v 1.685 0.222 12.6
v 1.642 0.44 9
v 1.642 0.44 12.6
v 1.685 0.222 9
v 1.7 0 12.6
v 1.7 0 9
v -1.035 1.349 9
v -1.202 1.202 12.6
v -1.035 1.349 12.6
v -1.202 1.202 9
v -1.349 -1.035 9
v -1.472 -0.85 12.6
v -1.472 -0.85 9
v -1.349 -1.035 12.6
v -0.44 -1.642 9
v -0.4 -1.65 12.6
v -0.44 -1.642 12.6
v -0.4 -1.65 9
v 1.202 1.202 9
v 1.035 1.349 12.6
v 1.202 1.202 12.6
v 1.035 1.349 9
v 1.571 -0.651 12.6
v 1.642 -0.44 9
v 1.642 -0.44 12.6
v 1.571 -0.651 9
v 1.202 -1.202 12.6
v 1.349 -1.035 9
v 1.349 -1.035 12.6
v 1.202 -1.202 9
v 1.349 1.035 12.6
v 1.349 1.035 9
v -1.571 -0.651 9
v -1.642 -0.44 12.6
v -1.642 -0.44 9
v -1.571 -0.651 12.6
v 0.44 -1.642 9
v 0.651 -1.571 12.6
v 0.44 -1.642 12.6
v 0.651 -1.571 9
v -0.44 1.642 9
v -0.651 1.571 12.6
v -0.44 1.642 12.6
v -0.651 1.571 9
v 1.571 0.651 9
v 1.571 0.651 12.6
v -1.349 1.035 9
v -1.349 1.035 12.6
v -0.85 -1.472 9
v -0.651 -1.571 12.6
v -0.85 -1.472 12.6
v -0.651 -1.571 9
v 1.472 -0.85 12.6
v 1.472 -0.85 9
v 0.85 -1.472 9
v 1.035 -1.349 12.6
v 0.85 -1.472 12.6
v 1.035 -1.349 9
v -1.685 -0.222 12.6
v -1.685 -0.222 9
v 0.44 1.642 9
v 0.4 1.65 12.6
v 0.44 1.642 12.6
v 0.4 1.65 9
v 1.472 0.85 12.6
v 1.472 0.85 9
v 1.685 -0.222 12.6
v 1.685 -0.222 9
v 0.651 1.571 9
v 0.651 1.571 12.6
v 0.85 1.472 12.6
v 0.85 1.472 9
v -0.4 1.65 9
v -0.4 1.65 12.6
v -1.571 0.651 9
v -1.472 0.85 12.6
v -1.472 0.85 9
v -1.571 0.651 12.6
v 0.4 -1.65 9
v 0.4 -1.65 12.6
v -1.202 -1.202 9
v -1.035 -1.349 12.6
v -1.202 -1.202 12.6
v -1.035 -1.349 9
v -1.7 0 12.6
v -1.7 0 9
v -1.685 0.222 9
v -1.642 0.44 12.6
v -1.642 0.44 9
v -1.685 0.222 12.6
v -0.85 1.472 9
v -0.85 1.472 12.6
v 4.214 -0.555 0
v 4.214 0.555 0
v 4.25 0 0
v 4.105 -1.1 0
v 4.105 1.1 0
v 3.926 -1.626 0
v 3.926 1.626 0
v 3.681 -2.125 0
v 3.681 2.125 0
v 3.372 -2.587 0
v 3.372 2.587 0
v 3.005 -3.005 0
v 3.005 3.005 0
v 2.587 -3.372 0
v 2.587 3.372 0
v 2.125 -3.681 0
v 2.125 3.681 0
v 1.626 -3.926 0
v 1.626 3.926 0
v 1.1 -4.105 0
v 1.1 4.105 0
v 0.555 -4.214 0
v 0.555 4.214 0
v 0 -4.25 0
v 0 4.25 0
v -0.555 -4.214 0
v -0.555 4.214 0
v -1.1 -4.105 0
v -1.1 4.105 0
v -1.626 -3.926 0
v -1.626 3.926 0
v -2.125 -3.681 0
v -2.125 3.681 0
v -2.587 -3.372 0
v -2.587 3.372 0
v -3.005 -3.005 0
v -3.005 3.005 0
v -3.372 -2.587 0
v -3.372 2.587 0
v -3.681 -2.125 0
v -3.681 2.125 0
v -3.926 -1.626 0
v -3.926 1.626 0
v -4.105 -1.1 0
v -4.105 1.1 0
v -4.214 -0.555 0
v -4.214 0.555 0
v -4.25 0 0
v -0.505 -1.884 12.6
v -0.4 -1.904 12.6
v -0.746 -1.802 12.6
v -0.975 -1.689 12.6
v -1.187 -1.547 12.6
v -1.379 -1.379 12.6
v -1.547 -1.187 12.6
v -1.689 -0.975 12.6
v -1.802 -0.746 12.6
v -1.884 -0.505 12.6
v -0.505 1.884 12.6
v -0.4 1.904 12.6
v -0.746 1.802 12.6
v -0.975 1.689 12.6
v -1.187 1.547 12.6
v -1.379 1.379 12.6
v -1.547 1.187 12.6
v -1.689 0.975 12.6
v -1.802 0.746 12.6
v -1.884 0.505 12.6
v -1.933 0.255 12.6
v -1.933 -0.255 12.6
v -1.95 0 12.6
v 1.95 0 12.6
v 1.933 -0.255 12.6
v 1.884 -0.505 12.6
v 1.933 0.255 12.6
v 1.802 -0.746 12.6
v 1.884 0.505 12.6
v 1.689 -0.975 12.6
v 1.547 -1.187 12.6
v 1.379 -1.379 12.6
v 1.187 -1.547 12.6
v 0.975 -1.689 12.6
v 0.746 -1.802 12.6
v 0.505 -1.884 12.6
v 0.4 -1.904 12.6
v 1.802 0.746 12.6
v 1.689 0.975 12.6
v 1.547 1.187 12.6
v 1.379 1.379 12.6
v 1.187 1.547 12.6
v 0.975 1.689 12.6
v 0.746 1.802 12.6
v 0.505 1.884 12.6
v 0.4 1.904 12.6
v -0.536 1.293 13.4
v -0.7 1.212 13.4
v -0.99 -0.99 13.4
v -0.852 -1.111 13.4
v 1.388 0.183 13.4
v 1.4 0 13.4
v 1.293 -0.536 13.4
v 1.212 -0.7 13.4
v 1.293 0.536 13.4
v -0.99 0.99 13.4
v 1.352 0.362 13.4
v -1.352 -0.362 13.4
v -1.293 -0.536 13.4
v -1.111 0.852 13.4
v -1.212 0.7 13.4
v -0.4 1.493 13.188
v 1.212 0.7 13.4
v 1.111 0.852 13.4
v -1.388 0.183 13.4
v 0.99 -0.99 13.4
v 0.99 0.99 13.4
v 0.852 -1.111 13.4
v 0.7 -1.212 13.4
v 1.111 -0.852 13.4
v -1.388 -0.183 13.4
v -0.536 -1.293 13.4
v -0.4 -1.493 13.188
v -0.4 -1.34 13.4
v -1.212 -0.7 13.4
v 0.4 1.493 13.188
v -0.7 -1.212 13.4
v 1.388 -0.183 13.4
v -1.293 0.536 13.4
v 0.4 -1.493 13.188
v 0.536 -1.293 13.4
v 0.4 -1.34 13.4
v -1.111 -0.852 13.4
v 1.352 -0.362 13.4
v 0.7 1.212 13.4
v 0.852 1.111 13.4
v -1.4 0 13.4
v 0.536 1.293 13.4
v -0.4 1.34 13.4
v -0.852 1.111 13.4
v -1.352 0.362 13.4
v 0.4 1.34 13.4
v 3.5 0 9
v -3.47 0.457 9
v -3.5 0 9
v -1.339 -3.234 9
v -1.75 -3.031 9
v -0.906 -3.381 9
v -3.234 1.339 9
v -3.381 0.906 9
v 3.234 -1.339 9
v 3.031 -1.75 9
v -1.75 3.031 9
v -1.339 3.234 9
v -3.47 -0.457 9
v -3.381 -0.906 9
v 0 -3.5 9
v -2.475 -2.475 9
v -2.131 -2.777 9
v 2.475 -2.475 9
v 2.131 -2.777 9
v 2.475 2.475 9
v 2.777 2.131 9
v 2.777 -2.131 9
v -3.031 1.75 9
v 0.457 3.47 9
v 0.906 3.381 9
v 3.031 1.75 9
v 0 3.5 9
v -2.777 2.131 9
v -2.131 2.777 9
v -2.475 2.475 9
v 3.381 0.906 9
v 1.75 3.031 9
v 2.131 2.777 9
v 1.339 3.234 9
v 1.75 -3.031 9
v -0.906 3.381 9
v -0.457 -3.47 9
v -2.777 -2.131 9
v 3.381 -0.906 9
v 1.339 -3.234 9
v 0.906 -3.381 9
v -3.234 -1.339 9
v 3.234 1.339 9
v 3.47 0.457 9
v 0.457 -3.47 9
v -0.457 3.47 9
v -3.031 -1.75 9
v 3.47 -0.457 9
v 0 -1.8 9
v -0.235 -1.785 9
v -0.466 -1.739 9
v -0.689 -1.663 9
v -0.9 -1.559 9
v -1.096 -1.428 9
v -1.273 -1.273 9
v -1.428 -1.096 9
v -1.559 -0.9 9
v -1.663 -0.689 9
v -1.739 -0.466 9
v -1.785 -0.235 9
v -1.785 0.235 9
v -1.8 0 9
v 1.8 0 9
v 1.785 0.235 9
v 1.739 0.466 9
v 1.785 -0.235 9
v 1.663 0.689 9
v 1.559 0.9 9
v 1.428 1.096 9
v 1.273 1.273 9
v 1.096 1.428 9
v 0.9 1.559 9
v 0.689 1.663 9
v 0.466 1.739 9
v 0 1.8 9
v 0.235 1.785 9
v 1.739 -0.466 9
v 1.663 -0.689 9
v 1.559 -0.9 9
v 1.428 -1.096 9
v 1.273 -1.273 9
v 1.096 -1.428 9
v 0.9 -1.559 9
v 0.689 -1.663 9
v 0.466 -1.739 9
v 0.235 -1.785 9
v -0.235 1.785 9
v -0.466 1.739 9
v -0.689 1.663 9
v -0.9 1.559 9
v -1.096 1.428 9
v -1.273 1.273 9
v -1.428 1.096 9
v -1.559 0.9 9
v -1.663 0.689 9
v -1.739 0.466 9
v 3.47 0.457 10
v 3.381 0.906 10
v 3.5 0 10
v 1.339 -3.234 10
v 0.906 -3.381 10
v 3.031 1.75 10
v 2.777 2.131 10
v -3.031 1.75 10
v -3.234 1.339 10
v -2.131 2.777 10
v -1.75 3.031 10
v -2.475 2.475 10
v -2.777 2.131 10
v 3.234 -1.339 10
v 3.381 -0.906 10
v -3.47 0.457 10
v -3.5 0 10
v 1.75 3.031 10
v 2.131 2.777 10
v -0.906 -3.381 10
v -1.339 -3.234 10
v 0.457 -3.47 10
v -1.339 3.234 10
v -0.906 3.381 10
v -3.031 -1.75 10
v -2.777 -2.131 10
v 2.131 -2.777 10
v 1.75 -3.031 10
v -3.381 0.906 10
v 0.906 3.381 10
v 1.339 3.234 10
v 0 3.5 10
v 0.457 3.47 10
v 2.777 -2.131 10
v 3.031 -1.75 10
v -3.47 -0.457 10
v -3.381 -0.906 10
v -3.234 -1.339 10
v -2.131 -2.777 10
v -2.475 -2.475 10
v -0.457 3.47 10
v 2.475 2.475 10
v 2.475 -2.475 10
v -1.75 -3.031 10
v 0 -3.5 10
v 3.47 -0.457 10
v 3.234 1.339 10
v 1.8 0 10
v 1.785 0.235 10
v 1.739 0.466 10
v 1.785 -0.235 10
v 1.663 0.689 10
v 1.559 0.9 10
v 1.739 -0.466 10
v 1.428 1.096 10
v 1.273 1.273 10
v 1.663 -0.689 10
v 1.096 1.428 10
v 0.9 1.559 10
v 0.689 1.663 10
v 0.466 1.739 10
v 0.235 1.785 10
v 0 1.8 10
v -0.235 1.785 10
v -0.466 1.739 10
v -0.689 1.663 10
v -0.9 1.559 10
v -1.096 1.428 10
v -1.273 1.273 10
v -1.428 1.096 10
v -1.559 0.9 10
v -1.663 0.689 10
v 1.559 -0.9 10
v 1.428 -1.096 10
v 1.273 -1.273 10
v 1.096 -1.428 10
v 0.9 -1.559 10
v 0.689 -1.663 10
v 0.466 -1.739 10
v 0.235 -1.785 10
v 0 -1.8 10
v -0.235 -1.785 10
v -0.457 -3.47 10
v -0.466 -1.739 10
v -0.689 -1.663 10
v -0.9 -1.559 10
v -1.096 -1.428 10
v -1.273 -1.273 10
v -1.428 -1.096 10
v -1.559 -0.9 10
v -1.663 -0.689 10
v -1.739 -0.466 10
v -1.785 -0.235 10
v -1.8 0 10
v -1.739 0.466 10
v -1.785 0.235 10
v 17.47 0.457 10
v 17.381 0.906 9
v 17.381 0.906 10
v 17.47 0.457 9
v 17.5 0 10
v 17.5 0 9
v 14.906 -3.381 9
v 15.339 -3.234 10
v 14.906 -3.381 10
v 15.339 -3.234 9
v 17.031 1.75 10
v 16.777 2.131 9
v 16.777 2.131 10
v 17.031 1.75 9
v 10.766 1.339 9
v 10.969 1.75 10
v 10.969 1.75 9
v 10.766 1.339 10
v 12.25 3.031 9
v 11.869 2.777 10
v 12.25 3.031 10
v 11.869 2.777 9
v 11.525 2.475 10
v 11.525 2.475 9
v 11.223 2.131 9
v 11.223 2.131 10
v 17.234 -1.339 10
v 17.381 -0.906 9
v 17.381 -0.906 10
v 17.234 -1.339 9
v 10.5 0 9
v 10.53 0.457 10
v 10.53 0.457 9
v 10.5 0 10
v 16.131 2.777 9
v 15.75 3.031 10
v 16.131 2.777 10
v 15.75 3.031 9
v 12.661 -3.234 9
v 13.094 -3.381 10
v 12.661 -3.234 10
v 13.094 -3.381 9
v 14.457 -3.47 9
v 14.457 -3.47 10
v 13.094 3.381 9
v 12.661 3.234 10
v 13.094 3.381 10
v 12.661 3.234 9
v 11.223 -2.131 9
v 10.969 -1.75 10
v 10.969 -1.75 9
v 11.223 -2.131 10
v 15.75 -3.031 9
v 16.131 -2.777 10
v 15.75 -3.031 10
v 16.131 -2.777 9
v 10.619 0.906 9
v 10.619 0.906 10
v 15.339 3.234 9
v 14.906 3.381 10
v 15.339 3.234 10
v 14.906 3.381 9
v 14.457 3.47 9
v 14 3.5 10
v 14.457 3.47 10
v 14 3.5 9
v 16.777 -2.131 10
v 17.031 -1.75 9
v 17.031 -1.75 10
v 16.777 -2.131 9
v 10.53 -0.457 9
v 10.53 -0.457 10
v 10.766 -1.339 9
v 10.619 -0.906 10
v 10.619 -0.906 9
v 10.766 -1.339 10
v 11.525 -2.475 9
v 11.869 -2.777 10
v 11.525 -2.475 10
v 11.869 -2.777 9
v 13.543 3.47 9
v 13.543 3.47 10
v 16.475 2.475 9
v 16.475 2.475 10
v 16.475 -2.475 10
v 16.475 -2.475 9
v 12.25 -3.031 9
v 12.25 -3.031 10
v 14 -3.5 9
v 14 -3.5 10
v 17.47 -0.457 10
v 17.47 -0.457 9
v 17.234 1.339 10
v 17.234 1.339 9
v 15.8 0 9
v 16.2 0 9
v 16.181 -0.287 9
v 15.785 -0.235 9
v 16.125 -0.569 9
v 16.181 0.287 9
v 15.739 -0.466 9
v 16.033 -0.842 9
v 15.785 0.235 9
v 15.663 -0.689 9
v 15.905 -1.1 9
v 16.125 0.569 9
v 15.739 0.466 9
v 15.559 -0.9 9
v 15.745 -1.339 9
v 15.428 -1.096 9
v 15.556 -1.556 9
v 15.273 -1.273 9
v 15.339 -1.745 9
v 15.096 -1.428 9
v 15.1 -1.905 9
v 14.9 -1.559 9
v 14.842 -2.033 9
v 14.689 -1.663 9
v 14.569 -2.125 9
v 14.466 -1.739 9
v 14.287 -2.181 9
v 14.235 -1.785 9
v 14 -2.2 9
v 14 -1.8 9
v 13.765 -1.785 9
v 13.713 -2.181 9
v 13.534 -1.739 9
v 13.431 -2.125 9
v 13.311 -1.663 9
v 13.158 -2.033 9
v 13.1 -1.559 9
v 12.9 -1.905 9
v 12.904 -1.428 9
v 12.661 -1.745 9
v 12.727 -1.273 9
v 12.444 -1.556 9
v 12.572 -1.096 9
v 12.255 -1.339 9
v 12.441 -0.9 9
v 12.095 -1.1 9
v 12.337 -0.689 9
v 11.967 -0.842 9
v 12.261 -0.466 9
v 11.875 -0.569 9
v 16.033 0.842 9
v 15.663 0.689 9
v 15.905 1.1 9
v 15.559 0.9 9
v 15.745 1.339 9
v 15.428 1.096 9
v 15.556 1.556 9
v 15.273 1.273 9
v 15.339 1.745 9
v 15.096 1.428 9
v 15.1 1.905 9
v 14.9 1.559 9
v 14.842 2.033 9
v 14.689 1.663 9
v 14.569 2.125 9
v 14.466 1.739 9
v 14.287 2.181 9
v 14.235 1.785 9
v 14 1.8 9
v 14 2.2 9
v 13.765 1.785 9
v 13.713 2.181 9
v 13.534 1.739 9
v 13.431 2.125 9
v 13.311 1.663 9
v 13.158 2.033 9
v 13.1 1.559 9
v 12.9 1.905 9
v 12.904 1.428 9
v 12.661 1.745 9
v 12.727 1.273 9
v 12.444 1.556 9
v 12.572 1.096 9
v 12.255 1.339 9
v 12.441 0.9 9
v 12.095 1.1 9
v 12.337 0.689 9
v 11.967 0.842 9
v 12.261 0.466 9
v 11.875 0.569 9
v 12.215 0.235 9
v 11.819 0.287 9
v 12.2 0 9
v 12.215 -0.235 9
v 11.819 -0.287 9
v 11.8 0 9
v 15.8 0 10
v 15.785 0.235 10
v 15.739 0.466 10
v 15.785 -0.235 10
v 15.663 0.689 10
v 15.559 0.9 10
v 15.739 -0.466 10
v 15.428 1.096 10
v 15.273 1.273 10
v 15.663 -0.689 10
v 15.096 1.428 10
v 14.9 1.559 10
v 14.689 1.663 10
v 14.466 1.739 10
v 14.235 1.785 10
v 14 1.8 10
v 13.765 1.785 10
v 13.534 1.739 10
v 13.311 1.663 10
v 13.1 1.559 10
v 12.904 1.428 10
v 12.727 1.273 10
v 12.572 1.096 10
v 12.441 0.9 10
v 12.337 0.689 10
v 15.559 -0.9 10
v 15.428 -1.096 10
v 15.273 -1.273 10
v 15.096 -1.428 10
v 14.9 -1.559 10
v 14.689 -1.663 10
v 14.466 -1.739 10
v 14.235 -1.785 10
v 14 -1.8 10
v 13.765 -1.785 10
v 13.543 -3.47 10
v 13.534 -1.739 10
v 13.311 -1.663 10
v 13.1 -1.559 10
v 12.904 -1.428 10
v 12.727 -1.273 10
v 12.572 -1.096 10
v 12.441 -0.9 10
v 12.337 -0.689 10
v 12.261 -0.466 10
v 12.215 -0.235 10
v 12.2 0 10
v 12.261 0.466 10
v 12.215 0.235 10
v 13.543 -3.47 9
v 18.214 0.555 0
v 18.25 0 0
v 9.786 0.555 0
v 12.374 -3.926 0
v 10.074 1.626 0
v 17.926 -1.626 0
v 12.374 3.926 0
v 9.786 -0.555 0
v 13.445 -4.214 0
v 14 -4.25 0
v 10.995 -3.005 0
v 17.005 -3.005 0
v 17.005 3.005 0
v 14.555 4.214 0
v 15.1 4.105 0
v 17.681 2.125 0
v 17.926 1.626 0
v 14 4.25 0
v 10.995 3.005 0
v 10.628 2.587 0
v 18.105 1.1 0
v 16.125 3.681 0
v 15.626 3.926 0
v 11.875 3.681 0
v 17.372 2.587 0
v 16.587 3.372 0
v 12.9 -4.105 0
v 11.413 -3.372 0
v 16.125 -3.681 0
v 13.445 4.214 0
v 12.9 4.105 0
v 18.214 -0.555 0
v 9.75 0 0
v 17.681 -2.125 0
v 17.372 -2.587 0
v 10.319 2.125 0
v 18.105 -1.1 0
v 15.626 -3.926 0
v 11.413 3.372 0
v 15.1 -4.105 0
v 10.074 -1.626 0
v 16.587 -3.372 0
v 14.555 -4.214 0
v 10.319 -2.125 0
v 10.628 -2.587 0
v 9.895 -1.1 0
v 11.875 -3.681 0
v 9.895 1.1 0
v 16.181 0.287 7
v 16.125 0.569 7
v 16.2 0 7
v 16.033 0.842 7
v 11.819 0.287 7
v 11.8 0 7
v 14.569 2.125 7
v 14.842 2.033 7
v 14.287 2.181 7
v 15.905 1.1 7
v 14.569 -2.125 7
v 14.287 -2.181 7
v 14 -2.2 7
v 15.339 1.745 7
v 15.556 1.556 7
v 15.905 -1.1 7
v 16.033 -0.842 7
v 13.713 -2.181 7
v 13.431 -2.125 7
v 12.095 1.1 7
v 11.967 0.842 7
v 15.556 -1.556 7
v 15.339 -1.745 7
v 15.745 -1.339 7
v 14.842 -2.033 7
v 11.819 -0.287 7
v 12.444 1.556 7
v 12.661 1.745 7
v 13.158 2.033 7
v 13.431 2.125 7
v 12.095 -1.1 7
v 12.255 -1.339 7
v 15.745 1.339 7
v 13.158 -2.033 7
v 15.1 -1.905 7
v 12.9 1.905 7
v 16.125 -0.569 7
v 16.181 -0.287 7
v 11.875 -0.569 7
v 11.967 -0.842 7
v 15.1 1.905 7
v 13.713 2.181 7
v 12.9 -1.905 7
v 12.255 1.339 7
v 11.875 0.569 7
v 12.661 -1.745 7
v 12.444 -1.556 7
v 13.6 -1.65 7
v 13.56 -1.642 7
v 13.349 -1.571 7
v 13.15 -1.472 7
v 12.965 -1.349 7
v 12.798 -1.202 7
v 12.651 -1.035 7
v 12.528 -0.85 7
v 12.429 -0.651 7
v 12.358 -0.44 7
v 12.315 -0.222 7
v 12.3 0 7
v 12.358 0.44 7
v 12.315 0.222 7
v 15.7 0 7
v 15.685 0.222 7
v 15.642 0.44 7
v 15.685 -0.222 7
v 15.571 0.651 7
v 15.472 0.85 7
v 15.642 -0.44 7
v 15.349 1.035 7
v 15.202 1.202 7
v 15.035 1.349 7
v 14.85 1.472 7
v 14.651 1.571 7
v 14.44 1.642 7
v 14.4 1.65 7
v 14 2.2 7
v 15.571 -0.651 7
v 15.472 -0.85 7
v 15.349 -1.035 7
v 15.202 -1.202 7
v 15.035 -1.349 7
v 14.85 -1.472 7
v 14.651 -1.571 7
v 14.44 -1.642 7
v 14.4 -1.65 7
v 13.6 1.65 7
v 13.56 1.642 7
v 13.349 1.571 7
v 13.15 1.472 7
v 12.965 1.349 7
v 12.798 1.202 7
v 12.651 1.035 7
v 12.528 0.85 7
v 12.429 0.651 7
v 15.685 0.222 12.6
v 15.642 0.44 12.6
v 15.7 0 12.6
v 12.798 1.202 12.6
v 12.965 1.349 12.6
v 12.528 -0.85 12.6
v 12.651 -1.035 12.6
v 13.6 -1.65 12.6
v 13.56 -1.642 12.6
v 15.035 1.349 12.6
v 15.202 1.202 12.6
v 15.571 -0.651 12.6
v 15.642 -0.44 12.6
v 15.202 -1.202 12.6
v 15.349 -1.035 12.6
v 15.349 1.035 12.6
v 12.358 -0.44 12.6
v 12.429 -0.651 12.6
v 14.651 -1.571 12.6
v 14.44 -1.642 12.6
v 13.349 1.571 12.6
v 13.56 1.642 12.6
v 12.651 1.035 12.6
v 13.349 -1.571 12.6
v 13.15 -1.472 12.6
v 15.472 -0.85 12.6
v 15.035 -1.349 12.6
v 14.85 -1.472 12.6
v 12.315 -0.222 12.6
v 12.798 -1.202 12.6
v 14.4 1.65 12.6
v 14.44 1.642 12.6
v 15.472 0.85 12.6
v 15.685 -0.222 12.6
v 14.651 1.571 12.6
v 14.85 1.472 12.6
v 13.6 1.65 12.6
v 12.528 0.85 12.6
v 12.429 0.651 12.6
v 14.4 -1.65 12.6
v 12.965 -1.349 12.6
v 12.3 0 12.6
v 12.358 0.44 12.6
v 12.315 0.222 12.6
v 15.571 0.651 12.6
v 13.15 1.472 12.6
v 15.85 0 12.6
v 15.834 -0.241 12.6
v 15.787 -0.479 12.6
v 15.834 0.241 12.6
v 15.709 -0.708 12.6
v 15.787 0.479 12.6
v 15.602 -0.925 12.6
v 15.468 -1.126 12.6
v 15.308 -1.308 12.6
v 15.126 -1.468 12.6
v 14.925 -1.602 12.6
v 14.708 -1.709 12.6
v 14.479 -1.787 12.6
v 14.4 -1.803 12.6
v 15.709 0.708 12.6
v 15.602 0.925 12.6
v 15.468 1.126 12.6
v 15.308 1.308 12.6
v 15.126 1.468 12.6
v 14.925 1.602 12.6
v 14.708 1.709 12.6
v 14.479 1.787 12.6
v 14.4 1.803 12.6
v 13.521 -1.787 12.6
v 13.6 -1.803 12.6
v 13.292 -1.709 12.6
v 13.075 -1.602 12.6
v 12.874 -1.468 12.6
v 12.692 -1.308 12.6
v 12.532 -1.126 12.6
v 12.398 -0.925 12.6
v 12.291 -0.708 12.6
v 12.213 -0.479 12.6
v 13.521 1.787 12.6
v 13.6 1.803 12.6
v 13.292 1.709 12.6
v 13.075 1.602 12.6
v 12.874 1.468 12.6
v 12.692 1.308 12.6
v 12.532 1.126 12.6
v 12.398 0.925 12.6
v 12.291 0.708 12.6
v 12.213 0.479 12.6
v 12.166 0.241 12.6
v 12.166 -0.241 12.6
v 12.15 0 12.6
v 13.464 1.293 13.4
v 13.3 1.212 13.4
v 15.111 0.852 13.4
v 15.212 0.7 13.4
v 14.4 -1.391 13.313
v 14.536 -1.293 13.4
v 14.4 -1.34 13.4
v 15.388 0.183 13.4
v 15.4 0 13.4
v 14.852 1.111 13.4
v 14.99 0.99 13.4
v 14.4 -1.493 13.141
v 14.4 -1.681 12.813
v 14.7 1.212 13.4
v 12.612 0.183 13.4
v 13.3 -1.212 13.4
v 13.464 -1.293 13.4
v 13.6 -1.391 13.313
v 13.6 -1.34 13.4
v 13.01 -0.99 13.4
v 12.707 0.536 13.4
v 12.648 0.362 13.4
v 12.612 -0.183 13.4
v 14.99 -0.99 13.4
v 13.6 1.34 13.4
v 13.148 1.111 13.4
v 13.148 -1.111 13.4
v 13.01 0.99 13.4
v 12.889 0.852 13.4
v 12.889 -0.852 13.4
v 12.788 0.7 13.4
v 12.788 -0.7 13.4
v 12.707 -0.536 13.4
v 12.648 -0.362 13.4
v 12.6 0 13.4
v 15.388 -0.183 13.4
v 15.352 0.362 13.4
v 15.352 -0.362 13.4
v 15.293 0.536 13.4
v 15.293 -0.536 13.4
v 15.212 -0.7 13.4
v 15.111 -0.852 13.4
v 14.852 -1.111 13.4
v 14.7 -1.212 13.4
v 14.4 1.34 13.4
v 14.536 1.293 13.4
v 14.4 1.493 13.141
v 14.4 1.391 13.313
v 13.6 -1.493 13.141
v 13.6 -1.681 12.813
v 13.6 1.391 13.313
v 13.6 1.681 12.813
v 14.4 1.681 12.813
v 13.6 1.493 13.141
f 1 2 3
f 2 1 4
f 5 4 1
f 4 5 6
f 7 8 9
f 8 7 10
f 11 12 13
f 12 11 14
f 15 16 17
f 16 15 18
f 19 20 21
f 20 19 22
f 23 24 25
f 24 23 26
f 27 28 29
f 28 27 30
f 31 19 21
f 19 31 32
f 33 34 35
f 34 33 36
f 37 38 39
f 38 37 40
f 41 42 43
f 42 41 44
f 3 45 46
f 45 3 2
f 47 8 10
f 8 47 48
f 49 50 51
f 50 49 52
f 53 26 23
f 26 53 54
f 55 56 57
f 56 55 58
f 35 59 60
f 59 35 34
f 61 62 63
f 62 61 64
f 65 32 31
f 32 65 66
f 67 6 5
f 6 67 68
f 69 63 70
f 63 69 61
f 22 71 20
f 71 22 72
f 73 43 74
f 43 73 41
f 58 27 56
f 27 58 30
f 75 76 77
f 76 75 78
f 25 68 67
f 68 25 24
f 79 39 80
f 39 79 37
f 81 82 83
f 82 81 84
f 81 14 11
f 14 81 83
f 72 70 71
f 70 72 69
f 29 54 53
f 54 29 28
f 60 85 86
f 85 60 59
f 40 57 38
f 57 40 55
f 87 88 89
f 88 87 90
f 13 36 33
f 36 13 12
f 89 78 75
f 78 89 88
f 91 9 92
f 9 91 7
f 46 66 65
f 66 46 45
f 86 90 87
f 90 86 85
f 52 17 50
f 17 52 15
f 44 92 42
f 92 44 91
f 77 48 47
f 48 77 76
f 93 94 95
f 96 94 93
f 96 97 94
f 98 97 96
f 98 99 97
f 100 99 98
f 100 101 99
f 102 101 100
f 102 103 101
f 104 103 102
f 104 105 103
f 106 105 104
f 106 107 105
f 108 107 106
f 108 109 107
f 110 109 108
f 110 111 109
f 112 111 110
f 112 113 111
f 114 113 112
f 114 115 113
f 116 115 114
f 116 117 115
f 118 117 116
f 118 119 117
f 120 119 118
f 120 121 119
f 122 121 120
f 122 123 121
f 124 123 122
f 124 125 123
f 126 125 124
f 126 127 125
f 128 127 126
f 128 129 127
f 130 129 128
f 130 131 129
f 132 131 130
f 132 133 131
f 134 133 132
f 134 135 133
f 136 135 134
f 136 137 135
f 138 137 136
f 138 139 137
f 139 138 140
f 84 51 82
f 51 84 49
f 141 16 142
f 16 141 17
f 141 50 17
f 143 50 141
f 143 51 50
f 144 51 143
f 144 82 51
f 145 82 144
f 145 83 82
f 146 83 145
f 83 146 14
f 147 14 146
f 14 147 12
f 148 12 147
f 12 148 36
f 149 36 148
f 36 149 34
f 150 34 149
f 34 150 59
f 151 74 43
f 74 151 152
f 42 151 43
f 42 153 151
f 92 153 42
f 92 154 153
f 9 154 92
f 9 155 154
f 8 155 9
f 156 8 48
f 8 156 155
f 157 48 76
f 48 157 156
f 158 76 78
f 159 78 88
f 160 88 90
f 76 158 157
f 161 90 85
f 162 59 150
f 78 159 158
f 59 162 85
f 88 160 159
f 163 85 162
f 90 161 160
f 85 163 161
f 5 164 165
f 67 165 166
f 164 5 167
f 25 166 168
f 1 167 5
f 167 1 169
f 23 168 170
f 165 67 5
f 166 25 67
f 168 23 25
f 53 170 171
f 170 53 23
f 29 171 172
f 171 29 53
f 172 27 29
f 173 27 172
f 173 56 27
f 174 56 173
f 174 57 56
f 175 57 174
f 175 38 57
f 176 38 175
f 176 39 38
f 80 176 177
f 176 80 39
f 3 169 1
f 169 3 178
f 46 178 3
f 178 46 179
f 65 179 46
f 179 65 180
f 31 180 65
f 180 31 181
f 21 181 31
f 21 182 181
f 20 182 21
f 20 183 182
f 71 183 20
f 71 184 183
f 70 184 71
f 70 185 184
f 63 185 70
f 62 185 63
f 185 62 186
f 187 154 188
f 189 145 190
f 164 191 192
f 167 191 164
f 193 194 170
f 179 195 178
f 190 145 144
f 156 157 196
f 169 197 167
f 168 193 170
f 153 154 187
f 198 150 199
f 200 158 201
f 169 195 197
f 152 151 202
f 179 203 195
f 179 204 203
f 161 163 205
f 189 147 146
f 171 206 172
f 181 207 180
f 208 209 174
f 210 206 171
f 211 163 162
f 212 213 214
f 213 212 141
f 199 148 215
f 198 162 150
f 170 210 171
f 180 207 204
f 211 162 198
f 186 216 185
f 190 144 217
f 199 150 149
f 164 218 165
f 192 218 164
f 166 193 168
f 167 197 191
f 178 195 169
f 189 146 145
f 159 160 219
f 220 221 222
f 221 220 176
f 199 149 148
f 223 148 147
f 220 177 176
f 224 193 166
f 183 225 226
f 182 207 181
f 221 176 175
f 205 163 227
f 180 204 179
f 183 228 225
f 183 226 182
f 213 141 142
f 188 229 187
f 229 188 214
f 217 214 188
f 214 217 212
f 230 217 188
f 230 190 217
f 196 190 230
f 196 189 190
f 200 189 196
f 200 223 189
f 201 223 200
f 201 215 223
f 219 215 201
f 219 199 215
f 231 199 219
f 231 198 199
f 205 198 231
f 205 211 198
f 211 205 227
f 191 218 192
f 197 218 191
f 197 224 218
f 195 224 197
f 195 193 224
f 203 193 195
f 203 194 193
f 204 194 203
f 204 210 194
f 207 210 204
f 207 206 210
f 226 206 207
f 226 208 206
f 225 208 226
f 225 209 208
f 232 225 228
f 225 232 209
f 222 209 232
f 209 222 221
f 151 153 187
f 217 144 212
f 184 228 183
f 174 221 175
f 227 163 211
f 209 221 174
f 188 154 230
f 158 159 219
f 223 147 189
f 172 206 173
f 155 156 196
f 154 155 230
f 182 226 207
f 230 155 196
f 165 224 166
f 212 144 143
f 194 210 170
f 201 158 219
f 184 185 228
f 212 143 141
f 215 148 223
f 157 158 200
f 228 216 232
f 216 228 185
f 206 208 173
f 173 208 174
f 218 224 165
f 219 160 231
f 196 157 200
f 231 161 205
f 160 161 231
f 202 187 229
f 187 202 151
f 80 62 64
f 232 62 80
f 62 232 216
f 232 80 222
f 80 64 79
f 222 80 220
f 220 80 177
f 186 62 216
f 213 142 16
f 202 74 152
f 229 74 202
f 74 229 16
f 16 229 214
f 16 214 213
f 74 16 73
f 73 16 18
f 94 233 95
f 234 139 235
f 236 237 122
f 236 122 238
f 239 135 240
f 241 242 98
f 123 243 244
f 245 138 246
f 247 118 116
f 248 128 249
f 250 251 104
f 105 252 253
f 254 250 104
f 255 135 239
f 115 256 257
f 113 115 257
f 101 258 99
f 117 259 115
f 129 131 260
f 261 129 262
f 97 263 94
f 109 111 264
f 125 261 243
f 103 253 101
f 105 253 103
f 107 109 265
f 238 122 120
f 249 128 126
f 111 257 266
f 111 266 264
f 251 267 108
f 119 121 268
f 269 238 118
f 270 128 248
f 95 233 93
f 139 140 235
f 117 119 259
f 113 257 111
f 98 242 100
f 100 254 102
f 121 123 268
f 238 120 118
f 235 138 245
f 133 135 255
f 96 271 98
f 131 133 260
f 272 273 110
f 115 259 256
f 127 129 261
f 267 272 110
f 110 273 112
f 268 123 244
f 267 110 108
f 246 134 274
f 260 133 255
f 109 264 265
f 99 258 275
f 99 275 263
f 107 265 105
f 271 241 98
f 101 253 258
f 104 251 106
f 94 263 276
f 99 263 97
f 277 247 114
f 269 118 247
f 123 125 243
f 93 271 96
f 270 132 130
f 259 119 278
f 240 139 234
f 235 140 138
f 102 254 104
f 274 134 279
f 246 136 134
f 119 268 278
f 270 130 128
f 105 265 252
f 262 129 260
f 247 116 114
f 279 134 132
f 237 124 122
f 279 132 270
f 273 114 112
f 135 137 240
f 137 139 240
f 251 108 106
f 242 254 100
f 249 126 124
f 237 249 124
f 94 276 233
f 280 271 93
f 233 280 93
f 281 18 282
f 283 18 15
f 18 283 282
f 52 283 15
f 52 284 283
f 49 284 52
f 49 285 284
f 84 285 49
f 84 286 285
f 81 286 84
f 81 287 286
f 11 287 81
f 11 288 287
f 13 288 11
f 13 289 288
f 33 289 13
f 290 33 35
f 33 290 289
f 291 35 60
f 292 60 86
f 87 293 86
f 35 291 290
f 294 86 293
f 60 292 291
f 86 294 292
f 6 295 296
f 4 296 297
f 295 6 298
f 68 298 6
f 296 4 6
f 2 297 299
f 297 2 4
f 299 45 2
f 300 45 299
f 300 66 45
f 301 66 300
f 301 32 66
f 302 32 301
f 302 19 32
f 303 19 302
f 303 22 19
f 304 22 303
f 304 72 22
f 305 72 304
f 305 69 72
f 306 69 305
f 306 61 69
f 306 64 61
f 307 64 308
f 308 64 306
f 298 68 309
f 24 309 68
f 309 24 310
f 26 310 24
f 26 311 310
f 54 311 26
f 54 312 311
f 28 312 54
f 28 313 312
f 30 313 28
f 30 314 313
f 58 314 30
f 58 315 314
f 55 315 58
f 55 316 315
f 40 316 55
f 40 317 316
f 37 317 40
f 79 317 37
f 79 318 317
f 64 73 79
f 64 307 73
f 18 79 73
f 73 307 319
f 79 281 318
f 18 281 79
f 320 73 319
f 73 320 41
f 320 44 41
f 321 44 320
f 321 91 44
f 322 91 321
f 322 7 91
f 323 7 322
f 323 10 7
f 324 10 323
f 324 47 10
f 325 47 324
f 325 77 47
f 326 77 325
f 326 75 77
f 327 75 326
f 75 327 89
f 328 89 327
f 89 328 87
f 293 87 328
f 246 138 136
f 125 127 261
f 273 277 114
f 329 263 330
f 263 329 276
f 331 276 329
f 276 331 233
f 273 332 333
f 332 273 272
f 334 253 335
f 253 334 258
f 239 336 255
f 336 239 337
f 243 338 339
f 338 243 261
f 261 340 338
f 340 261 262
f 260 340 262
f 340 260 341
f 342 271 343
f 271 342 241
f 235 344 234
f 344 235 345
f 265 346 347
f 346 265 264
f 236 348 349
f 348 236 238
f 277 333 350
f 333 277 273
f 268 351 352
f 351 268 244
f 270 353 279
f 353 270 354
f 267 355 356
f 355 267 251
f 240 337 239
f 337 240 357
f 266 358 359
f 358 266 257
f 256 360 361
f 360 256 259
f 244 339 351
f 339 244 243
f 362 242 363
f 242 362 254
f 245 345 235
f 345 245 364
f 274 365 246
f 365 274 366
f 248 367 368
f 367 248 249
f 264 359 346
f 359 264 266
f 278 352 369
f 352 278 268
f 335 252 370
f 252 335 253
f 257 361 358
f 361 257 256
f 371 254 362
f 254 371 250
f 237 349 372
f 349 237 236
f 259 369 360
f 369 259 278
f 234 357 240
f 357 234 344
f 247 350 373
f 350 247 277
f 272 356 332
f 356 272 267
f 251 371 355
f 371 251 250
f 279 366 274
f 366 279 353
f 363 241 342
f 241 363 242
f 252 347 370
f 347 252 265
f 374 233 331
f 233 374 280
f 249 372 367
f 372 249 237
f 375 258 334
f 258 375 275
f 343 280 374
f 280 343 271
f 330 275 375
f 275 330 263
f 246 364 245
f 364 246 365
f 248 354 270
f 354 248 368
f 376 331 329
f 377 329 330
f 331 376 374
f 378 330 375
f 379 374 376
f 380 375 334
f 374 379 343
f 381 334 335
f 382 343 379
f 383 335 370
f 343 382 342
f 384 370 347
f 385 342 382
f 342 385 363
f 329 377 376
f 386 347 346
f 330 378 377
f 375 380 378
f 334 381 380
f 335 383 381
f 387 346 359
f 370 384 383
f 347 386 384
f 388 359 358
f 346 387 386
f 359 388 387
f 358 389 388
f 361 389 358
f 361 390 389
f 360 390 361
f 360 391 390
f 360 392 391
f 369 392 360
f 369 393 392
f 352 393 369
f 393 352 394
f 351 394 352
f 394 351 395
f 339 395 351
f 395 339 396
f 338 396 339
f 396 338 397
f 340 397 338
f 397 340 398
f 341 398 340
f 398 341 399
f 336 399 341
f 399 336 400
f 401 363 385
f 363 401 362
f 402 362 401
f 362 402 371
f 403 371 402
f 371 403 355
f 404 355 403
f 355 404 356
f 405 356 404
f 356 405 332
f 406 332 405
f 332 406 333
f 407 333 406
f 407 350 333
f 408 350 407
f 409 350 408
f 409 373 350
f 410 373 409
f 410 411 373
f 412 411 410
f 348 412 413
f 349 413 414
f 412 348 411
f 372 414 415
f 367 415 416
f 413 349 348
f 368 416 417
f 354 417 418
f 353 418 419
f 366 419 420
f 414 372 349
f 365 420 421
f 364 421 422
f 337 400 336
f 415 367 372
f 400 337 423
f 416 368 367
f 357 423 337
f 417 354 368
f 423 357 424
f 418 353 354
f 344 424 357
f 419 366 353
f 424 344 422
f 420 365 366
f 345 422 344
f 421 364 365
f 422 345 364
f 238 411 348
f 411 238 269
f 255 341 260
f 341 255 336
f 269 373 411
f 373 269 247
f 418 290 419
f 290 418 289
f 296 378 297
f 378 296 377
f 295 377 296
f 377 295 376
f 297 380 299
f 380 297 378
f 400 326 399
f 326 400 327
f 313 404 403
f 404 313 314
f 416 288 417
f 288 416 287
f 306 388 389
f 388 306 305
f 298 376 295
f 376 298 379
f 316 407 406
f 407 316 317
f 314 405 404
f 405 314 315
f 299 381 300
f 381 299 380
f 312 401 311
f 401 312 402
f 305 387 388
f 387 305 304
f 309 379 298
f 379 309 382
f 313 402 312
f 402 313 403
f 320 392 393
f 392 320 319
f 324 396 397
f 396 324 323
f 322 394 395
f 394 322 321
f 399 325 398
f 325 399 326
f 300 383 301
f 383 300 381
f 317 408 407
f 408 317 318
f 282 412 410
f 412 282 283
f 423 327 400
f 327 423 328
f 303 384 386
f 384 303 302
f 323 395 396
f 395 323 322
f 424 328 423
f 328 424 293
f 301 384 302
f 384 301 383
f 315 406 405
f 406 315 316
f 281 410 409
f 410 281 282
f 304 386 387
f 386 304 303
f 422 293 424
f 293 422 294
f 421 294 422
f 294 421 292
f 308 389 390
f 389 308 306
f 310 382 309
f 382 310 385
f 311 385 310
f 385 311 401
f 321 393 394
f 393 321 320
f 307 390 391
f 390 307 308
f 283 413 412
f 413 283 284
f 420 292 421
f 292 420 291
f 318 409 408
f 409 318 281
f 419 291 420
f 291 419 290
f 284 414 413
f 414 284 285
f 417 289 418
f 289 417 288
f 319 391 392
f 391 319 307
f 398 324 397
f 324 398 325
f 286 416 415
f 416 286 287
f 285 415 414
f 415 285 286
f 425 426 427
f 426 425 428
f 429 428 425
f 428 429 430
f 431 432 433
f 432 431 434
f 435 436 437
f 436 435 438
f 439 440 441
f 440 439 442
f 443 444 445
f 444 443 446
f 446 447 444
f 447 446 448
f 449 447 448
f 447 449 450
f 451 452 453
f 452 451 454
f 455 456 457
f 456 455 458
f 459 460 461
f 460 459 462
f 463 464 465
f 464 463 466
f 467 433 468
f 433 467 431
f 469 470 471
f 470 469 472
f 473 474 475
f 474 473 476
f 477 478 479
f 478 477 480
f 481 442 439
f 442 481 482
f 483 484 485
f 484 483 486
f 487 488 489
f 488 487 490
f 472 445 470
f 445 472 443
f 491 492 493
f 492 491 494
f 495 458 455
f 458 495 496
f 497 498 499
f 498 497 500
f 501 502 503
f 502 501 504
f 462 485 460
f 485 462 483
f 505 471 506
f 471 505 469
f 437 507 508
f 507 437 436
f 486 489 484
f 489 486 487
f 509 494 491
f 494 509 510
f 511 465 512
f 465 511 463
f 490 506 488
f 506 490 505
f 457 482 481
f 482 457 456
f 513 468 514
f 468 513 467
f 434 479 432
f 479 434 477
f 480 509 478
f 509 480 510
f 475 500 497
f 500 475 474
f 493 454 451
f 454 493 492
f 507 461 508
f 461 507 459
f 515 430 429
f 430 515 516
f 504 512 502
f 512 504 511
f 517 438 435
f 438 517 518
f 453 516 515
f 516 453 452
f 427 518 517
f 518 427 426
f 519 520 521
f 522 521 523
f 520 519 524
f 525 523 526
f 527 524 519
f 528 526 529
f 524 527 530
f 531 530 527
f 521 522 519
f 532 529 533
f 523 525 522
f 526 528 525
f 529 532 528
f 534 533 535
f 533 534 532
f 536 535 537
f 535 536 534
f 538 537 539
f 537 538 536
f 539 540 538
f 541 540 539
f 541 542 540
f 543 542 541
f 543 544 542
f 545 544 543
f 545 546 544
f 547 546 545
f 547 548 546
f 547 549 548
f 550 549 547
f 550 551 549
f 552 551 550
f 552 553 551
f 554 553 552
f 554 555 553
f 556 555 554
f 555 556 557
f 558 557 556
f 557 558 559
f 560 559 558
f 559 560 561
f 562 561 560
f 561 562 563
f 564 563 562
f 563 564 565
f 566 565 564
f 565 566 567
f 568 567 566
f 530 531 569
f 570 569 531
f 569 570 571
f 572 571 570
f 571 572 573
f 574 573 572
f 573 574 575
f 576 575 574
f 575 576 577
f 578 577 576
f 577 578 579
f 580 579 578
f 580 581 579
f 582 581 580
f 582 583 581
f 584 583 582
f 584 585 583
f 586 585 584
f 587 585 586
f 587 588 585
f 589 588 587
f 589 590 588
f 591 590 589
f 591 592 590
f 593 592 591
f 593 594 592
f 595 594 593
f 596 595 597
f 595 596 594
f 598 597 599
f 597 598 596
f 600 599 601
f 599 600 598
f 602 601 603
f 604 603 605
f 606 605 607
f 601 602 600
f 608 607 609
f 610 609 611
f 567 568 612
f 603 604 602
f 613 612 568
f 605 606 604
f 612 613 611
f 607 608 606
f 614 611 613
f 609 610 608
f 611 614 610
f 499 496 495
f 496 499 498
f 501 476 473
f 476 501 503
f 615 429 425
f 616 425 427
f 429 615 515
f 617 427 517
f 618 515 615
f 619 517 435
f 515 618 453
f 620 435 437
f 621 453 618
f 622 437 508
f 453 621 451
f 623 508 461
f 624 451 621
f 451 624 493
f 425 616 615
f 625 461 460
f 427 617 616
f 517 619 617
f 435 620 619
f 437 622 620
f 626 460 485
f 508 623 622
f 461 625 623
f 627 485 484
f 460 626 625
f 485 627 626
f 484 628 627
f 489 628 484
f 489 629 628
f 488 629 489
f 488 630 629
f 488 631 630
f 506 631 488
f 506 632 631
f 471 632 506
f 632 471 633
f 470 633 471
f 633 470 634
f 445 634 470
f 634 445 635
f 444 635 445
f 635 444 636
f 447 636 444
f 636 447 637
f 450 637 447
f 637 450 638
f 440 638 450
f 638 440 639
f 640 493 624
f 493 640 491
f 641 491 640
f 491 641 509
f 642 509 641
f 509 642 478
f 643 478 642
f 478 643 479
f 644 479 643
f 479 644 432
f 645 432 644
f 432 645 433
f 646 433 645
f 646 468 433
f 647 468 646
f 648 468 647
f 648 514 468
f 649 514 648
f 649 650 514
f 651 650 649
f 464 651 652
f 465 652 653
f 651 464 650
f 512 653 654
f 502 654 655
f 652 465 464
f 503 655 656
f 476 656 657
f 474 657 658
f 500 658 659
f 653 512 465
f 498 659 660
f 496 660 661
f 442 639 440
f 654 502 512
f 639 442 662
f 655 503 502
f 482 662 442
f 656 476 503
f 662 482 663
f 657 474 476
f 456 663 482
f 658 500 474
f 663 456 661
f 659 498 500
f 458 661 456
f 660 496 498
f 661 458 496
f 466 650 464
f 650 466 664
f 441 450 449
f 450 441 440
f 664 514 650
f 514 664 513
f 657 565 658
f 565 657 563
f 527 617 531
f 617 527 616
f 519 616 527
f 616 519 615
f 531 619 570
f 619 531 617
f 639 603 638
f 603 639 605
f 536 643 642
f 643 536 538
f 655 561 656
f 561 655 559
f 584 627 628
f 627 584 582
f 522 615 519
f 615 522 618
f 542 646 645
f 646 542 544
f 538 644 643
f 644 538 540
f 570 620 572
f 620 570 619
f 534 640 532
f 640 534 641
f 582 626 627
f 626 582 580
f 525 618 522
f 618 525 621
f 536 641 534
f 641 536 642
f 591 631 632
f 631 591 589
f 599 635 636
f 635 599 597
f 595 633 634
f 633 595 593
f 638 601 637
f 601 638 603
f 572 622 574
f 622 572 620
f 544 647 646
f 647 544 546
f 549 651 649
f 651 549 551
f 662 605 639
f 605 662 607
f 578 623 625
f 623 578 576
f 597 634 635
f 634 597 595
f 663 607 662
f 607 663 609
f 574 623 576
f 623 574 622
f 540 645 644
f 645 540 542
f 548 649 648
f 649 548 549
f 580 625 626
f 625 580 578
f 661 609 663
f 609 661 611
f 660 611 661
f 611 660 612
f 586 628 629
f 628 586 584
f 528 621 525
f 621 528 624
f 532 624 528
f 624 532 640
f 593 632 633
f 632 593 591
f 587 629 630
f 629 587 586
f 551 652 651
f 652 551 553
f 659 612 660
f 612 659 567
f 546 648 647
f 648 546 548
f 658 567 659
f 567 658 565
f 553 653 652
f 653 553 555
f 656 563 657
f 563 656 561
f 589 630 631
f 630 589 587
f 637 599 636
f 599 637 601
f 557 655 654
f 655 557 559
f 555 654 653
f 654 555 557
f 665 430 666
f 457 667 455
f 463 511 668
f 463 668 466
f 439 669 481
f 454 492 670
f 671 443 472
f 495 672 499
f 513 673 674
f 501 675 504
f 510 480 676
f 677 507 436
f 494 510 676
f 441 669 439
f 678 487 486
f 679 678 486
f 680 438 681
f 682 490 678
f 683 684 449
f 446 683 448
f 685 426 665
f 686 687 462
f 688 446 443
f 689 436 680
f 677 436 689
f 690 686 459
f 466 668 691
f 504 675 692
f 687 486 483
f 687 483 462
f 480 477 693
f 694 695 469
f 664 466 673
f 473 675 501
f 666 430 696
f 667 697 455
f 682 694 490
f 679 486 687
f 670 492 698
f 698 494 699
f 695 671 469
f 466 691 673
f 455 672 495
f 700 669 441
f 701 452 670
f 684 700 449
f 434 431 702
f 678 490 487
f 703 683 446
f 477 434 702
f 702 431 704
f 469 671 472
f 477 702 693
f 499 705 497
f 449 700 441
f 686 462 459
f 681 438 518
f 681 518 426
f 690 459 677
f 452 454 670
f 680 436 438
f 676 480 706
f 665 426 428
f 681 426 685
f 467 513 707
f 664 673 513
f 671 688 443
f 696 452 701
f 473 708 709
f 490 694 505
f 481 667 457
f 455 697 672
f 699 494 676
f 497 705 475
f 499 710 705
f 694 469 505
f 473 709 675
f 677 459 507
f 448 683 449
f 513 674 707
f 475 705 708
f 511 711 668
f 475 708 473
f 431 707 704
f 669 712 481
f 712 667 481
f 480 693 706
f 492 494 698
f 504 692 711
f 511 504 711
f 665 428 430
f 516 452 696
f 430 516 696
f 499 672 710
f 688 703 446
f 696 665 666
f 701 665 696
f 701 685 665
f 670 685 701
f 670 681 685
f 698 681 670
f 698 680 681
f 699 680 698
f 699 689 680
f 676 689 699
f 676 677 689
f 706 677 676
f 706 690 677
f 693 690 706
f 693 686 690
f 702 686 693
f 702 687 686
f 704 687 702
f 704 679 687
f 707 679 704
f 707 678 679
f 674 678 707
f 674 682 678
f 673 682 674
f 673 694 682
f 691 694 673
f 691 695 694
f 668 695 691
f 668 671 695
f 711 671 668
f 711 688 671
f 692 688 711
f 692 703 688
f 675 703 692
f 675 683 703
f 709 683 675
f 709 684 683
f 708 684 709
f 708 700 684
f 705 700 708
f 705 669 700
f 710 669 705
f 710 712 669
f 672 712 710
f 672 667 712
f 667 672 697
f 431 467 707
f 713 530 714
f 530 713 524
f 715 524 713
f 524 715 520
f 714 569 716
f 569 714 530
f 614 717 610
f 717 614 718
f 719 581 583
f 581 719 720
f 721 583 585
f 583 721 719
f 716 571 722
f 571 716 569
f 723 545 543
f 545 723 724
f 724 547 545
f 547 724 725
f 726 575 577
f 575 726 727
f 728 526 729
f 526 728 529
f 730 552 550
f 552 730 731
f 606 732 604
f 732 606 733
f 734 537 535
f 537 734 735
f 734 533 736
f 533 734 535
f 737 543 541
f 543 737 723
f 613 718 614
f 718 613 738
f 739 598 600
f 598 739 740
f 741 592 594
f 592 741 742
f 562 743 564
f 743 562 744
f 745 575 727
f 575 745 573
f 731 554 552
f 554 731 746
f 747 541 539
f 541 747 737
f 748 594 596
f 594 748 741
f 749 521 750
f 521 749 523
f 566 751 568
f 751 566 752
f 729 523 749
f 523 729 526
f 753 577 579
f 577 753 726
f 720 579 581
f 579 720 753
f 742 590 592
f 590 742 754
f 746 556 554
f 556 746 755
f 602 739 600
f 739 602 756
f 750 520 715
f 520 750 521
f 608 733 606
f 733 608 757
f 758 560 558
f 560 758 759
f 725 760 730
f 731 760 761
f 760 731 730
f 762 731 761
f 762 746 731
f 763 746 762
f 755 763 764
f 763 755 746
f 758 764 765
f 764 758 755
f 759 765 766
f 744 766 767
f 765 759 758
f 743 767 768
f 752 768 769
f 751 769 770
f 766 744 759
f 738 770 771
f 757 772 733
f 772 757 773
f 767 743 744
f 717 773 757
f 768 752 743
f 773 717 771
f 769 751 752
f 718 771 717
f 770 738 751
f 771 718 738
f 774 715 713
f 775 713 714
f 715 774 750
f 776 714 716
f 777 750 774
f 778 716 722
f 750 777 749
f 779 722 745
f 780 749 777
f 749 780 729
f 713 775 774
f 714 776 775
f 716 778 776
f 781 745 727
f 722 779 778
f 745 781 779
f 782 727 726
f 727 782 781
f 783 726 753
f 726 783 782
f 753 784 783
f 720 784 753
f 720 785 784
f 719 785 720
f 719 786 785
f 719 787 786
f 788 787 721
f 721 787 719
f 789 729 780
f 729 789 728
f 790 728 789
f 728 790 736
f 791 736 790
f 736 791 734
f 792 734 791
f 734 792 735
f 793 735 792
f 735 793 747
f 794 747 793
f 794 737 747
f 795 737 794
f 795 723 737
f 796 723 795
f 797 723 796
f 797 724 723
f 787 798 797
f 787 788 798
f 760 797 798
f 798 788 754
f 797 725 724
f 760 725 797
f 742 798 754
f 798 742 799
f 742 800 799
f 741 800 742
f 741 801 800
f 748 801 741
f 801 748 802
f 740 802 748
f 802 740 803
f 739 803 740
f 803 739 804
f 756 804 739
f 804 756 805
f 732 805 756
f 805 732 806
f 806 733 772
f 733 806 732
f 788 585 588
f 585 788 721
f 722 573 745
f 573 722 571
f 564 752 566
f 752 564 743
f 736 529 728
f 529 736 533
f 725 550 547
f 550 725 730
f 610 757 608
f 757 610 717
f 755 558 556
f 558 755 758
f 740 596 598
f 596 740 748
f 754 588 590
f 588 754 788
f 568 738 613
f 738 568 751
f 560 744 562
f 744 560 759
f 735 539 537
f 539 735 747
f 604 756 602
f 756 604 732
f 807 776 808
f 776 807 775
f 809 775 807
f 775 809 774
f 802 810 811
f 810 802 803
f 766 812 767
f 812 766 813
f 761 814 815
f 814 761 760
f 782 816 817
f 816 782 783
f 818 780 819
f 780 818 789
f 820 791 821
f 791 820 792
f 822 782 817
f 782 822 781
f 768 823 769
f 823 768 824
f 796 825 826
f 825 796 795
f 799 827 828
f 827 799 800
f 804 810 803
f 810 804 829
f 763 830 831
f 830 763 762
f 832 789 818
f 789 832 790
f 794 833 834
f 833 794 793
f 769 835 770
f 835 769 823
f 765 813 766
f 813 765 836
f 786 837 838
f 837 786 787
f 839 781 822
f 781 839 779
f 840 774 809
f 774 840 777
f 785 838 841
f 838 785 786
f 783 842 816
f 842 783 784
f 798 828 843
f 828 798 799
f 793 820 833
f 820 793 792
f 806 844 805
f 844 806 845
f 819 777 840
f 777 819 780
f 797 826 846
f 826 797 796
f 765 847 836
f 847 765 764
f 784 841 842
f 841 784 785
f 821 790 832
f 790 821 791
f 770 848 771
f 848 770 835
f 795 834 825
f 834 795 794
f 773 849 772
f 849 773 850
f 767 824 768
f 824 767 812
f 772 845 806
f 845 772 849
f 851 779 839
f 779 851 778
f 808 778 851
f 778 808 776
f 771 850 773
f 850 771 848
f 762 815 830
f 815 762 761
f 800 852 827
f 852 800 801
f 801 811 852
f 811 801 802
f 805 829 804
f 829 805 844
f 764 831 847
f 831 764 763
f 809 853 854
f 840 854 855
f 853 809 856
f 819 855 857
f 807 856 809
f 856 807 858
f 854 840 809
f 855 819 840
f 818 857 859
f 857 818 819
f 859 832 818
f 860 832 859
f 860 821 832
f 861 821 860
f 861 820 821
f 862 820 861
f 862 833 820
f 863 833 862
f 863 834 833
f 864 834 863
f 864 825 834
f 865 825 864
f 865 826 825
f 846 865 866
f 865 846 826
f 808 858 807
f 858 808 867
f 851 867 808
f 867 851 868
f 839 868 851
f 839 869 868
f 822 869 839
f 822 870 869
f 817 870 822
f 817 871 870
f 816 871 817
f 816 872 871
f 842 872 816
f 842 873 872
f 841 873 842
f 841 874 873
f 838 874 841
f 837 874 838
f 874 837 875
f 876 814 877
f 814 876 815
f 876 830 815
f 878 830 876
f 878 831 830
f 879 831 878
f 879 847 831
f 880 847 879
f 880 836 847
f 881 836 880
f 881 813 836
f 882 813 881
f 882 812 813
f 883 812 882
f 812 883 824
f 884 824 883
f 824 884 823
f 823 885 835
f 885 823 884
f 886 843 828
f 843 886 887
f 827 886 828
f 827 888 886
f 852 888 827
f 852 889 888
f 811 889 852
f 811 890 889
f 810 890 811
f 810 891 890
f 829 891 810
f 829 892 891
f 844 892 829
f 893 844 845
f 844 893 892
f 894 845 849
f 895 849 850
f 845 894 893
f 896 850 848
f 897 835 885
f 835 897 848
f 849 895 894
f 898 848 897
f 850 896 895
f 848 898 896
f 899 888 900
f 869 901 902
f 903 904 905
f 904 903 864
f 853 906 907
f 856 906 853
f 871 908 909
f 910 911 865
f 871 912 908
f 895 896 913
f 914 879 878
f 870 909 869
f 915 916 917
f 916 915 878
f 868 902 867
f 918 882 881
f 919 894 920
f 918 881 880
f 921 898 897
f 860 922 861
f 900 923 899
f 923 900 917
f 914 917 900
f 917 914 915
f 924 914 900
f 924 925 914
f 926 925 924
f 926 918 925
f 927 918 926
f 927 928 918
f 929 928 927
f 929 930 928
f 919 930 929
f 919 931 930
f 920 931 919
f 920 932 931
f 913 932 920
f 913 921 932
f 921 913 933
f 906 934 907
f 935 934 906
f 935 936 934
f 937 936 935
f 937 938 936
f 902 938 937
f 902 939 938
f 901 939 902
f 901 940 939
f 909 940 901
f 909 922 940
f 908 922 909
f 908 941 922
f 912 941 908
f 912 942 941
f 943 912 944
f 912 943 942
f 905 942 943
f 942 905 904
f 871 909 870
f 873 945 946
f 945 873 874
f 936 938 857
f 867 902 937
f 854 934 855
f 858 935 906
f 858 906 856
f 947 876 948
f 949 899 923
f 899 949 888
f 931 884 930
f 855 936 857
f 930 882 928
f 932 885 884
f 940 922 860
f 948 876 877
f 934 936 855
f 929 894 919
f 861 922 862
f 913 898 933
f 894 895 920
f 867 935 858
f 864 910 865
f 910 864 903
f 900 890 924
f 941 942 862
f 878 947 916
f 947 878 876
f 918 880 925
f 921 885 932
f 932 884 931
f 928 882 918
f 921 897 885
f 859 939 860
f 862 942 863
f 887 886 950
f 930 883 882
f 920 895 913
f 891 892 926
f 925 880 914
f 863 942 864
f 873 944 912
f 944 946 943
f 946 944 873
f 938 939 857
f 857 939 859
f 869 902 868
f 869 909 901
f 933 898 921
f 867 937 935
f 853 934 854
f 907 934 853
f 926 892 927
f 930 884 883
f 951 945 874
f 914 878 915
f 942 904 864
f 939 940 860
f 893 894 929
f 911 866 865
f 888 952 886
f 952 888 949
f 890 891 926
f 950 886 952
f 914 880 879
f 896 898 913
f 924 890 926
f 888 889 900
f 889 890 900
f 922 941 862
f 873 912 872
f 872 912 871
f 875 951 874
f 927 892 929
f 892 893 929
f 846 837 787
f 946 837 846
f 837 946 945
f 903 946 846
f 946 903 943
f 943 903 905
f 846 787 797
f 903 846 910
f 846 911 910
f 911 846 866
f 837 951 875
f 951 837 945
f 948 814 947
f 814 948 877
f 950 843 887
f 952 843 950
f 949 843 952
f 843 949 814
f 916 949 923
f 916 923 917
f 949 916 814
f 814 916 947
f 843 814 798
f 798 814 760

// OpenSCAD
// Review proto (not a part): the cam base's split pivot, today (Ø3.4 pin, 0.8 slit 4.5 deep, Ø3.9 head:
// 0.25 mm of bend per half-pin across the layers, 2.4 % at the root) and proposed (the slit 6.5 deep
// through a Ø4.4 × 2 relief in the column's top, Ø3.7 head: 0.15 mm, 0.7 %).  Printed standing on its
// plug, as today.  docs/printed-parts-review.md › Pegs.
//
//   openscad -D 'VIEW="both"' -o cam_pin.png mechanical/review/proto/cam_pin.scad
VIEW = "both";
H = 10; CAM_FLANGE = 1.0; CAM_RISE = 3.6; PIVOT_D = 3.4;
$fn = 48;
module base(head = 3.9, split = 4.5, relief = 0) {
    difference() {
        cylinder(d1 = 8.5, d2 = 7.0, h = H - CAM_FLANGE);
        if (relief) translate([0, 0, H - CAM_FLANGE - relief]) cylinder(d = 4.4, h = relief + 1);
    }
    difference() {
        union() {
            cylinder(d = PIVOT_D, h = H - CAM_FLANGE + CAM_RISE);
            translate([0, 0, H - CAM_FLANGE + CAM_RISE]) cylinder(d1 = head, d2 = PIVOT_D - 0.6, h = 0.8);
        }
        translate([-0.4, -5, H - CAM_FLANGE + CAM_RISE - split]) cube([0.8, 10, 10]);
    }
}
module cam_ghost() color("#f0a060", 0.35) translate([0, 0, H - CAM_FLANGE]) difference() { cylinder(d = 7, h = CAM_FLANGE); translate([0, 0, -1]) cylinder(d = PIVOT_D + 0.2, h = 5); }

if (VIEW == "today" || VIEW == "both") { color("#a9c4e4") base(); cam_ghost(); }
if (VIEW == "proposed" || VIEW == "both") translate([VIEW == "both" ? 14 : 0, 0, 0]) { color("#a9c4e4") base(3.7, 6.5, 2); cam_ghost(); }
